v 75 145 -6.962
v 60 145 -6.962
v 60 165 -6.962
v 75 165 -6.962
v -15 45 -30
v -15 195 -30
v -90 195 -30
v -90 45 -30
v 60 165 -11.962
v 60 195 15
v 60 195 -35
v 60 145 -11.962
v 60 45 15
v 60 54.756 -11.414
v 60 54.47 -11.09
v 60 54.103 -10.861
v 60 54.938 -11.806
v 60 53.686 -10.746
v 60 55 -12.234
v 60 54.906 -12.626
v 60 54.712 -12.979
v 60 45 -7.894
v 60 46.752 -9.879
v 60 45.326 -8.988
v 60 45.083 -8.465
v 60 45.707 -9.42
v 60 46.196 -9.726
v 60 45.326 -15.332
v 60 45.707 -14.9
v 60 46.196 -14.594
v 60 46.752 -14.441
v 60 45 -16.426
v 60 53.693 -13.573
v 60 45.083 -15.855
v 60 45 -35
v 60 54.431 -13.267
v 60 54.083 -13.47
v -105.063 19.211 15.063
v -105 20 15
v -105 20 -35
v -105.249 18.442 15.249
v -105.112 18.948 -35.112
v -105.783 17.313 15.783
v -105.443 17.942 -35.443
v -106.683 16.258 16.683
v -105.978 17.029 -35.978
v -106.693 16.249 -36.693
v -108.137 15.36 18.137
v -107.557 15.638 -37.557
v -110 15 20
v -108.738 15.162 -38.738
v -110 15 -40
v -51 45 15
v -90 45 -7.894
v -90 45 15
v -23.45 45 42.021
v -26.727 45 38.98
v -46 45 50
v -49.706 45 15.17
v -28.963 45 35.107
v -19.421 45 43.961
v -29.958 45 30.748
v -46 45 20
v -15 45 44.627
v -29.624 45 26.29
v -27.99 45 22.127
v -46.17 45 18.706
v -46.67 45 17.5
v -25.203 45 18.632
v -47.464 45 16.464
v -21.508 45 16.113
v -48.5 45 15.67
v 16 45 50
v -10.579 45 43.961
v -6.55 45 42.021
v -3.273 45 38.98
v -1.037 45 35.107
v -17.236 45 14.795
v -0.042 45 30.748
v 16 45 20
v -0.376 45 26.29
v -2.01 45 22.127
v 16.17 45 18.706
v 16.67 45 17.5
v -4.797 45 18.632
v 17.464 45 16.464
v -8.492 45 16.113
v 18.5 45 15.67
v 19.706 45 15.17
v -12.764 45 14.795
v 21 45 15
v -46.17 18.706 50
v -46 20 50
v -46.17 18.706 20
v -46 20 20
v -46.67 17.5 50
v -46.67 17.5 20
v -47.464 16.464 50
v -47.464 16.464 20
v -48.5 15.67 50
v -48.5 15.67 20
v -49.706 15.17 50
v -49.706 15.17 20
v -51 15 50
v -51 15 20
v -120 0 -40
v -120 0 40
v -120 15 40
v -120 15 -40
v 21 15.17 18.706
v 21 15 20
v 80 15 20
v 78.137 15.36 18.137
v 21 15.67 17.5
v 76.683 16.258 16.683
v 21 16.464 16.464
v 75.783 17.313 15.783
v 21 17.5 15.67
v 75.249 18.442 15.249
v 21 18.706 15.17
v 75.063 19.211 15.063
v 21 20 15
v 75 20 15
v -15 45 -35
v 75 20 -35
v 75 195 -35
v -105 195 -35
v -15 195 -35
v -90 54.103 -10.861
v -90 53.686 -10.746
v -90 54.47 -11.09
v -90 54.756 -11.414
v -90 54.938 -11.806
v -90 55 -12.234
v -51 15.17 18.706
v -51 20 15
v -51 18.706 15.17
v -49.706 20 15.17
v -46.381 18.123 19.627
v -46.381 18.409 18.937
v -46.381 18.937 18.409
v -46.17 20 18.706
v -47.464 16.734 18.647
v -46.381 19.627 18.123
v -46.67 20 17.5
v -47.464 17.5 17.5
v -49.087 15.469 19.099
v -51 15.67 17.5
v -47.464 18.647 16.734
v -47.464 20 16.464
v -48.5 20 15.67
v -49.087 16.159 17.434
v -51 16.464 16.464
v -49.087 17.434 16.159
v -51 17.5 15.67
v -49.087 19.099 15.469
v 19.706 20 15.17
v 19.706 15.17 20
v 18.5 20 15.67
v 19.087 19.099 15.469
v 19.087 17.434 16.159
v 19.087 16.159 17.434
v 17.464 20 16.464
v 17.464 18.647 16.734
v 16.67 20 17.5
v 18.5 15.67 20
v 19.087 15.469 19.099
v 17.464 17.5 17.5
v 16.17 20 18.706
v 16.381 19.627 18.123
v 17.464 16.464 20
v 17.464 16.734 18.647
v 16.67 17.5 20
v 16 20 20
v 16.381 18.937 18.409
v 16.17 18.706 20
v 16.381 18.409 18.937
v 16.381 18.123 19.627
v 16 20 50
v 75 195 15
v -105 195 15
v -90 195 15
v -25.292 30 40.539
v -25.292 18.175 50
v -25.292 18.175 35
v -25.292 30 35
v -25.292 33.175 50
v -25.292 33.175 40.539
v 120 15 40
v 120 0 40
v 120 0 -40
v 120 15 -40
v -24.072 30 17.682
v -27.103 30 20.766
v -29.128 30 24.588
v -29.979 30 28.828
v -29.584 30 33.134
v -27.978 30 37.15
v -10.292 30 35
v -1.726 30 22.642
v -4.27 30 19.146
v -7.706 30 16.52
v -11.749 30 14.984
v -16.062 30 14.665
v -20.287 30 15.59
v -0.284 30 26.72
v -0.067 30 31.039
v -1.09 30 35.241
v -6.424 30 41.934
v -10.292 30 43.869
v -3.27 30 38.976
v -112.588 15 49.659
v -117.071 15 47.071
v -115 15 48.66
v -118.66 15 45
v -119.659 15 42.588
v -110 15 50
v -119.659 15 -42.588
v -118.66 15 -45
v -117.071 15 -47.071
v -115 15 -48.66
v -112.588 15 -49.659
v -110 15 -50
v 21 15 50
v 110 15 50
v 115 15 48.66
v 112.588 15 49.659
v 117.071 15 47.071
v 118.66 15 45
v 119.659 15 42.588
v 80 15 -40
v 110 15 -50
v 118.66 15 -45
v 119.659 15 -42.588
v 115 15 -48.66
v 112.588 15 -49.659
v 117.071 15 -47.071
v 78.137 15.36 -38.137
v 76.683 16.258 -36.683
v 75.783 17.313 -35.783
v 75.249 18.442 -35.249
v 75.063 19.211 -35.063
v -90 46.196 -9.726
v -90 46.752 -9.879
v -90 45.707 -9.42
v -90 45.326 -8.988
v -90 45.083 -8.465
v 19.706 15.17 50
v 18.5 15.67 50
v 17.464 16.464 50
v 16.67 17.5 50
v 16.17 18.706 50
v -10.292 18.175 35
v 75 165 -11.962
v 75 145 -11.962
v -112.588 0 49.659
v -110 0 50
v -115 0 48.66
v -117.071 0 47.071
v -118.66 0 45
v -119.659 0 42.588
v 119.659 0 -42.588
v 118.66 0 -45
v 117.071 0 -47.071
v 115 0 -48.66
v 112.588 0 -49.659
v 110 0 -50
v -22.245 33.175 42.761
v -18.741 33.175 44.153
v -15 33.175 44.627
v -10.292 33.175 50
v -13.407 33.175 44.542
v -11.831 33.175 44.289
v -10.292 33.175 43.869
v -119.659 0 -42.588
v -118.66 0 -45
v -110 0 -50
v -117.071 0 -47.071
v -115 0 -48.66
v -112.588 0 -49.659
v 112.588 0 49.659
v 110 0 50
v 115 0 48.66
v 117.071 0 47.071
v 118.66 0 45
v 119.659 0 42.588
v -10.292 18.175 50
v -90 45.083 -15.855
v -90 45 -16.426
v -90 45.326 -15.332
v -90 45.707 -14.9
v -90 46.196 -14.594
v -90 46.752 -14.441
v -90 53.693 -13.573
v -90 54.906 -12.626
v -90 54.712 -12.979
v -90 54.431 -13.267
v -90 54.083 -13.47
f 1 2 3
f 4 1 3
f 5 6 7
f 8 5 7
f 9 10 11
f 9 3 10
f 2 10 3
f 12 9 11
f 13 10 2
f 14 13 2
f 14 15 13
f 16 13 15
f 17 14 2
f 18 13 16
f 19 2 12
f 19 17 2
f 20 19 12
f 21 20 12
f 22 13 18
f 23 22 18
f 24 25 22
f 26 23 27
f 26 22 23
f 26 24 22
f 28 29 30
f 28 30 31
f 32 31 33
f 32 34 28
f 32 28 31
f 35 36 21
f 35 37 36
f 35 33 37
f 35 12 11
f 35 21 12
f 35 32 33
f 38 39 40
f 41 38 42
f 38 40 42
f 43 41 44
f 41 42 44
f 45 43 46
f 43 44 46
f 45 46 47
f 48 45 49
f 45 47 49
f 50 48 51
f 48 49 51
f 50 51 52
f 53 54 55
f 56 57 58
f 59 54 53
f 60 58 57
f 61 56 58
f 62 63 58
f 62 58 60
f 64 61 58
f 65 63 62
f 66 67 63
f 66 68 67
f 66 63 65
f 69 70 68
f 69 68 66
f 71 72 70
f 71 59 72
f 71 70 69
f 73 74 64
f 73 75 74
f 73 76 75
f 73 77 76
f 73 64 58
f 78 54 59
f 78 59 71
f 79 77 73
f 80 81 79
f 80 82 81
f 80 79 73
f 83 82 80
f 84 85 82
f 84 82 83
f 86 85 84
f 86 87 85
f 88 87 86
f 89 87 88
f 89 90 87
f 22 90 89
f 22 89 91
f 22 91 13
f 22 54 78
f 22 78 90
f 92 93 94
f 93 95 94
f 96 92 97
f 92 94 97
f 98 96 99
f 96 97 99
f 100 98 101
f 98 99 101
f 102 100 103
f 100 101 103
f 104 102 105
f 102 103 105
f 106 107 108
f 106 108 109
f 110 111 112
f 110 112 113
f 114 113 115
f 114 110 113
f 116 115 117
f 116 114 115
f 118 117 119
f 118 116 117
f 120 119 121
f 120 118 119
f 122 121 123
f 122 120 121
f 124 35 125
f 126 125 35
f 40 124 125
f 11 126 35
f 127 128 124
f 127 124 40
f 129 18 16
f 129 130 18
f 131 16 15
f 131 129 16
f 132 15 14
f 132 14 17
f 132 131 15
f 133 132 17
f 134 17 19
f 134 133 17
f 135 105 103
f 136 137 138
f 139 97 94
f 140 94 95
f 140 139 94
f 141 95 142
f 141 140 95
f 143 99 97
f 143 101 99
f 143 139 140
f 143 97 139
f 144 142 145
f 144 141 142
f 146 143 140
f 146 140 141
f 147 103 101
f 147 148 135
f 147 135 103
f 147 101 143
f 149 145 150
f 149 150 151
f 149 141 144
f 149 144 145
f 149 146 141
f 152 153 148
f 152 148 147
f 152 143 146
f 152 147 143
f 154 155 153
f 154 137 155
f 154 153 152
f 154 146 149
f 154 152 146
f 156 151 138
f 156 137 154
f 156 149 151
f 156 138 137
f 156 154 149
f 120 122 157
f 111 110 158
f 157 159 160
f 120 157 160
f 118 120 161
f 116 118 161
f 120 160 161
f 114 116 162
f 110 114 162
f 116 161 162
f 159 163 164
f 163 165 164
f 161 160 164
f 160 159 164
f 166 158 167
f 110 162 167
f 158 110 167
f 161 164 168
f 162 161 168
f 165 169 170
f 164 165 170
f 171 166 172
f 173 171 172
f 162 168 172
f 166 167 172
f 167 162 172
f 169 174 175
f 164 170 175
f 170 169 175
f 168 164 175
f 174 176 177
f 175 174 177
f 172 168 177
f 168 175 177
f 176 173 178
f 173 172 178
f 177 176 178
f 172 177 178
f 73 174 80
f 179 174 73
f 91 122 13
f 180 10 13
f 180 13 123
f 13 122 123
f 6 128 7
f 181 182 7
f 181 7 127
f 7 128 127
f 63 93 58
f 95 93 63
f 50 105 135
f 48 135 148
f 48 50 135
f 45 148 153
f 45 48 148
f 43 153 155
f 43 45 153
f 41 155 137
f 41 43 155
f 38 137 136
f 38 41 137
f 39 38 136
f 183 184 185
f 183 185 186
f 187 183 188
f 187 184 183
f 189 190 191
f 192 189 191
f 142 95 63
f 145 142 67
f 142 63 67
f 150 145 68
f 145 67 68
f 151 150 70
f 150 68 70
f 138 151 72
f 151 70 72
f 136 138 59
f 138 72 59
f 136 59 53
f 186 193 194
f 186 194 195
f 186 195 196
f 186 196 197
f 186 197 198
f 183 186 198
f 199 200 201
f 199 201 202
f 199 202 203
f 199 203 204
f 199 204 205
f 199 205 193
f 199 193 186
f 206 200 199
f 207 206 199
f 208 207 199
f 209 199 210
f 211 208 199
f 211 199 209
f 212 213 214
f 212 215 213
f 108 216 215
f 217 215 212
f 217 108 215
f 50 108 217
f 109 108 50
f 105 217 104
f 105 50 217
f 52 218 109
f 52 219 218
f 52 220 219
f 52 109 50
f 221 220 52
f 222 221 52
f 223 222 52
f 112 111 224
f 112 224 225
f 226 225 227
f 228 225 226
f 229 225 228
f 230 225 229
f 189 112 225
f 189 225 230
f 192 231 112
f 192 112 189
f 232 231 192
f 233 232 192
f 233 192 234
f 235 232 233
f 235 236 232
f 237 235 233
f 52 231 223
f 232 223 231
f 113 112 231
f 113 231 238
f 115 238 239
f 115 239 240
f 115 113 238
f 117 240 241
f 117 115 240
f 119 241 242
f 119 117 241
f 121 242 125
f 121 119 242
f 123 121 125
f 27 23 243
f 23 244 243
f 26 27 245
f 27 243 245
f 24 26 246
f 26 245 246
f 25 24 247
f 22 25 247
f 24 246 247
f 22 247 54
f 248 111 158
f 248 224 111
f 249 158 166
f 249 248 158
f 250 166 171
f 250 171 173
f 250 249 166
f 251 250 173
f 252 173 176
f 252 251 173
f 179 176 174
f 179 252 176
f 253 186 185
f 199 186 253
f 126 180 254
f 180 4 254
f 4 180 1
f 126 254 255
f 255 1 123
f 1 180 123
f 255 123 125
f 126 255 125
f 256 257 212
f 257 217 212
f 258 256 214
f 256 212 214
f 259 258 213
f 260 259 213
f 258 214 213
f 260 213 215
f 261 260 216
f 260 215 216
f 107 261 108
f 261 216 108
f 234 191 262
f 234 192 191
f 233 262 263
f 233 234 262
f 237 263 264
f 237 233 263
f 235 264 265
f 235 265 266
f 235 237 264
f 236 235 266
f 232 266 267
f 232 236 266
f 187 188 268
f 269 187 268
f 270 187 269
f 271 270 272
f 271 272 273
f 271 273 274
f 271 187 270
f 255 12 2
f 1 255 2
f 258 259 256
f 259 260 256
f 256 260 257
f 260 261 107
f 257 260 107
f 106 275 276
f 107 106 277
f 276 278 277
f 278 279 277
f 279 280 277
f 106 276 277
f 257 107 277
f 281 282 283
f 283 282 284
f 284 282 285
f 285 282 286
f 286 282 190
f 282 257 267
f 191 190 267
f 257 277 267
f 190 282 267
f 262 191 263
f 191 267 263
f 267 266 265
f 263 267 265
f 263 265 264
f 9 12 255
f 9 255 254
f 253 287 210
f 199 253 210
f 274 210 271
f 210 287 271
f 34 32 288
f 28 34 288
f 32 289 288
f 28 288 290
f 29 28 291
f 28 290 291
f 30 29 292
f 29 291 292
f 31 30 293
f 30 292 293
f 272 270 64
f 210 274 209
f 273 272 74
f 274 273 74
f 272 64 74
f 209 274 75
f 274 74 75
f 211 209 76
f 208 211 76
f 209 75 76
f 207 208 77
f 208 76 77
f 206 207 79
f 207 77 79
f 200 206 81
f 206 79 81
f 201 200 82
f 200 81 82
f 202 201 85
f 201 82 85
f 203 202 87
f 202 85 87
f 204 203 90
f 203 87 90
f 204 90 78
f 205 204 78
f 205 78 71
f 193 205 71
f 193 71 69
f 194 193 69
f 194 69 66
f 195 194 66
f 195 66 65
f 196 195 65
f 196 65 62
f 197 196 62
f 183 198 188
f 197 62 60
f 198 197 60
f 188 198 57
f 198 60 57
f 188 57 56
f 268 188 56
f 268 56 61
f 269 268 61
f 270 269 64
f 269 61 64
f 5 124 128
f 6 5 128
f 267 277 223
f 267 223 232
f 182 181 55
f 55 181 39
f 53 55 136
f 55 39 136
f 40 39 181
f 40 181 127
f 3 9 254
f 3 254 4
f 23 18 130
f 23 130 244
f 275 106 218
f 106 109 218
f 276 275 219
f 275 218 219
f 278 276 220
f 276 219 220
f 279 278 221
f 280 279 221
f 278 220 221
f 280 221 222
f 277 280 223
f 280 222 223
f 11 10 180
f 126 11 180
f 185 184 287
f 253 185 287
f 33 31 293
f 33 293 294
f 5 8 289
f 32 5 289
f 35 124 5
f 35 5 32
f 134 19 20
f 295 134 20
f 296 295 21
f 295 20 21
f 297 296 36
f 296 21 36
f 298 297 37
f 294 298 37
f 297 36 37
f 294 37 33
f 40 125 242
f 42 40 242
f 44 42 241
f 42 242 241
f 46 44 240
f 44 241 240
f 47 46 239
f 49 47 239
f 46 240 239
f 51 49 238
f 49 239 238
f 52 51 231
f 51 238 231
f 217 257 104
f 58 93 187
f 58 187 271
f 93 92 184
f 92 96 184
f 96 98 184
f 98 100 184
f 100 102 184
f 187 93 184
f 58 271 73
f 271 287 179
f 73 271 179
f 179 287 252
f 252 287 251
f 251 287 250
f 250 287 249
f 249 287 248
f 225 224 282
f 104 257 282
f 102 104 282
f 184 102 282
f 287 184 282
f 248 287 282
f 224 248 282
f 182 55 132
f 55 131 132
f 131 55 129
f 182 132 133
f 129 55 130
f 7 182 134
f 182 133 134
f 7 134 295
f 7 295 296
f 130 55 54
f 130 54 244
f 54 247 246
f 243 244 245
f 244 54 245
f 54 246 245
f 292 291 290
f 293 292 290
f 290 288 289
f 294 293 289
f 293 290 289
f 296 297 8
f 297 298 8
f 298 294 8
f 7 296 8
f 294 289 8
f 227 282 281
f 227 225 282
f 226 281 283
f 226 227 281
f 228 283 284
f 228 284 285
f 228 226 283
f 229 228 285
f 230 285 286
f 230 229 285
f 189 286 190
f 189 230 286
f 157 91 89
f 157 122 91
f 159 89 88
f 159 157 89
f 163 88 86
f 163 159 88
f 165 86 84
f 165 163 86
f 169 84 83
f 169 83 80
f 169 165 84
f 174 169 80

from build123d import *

# Parameters (mm, degrees)
SKETCH1_W            = 240
SKETCH1_H            = 100
BOSS_EXTRUDE1_DEPTH  = 15
SKETCH5_W            = 15
SKETCH5_H            = 50
BOSS_EXTRUDE4_DEPTH  = 180
SKETCH12_W           = 150
SKETCH12_H           = 50
BOSS_EXTRUDE7_DEPTH  = 30
FILLET1_R            = 5
FILLET4_R            = 5
FILLET10_R           = 5
BOSS_EXTRUDE8_DEPTH  = 30
SKETCH17_R           = 15
CUT_EXTRUDE1_DEPTH   = 15
SKETCH18_W           = 15
SKETCH18_H           = 15
CUT_EXTRUDE3_DEPTH   = 15
FILLET11_R           = 5
FILLET12_R           = 5
FILLET13_R           = 5
FILLET14_R           = 5
BOSS_EXTRUDE10_DEPTH = 150
FILLET19_R           = 1.5
FILLET20_R           = 1.5
SKETCH24_W           = 75
SKETCH24_H           = 150
BOSS_EXTRUDE11_DEPTH = 5
FILLET23_R           = 2
FILLET24_R           = 2
FILLET25_R           = 10
FILLET26_R           = 10
FILLET27_R           = 10
FILLET28_R           = 10
SKETCH25_W           = 5
SKETCH25_H           = 20
CUT_EXTRUDE4_DEPTH   = 271.046292328


with BuildPart() as part:
    # Sketch1 → Boss-Extrude1 (new body)
    with BuildSketch(Plane(origin=(0, 0, 0), x_dir=(1, 0, 0), z_dir=(0, 1, 0))):
        Rectangle(SKETCH1_W, SKETCH1_H)
    extrude(amount=BOSS_EXTRUDE1_DEPTH)

    # Sketch5 → Boss-Extrude4 (add)
    with BuildSketch(Plane(origin=(0, 15, 0), x_dir=(1, 0, 0), z_dir=(0, 1, 0))):
        with Locations((-97.5, 10)):
            Rectangle(SKETCH5_W, SKETCH5_H)
        with Locations((67.5, 10)):
            Rectangle(SKETCH5_W, SKETCH5_H)
    extrude(amount=BOSS_EXTRUDE4_DEPTH)

    # Sketch12 → Boss-Extrude7 (add)
    with BuildSketch(Plane(origin=(0, 15, 0), x_dir=(1, 0, 0), z_dir=(0, 1, 0))):
        with Locations((-15, 10)):
            Rectangle(SKETCH12_W, SKETCH12_H)
    extrude(amount=BOSS_EXTRUDE7_DEPTH)

    # Fillet1
    fillet1_edges = [part.edges().sort_by_distance(p)[0] for p in [
        (-105, 15, -10),
    ]]
    fillet(fillet1_edges, radius=FILLET1_R)

    # Fillet4
    fillet4_edges = [part.edges().sort_by_distance(p)[0] for p in [
        (-17.5, 15, -35),
    ]]
    fillet(fillet4_edges, radius=FILLET4_R)

    # Fillet10
    fillet10_edges = [part.edges().sort_by_distance(p)[0] for p in [
        (75, 15, -12.5),
    ]]
    fillet(fillet10_edges, radius=FILLET10_R)

    # Sketch15 → Boss-Extrude8 (add)
    with BuildSketch(Plane(origin=(0, 15, 0), x_dir=(1, 0, 0), z_dir=(0, 1, 0))):
        Polygon((-15, -15), (16, -15), (16, -50), (-46, -50), (-46, -15), align=None)
    extrude(amount=BOSS_EXTRUDE8_DEPTH)

    # Sketch17 → Cut-Extrude1 (cut)
    with BuildSketch(Plane(origin=(0, 45, 0), x_dir=(1, 0, 0), z_dir=(0, 1, 0))):
        with Locations(Location((-15, -29.627354627, 0), (0, 0, 270))):
            Circle(SKETCH17_R)
    extrude(amount=-CUT_EXTRUDE1_DEPTH, mode=Mode.SUBTRACT)

    # Sketch18 → Cut-Extrude3 (cut)
    with BuildSketch(Plane.XY.offset(50)):
        with Locations((-17.79206598, 25.674800875)):
            Rectangle(SKETCH18_W, SKETCH18_H)
    extrude(amount=-CUT_EXTRUDE3_DEPTH, mode=Mode.SUBTRACT)

    # Fillet11
    fillet11_edges = [part.edges().sort_by_distance(p)[0] for p in [
        (48, 15, 15),
    ]]
    fillet(fillet11_edges, radius=FILLET11_R)

    # Fillet12
    fillet12_edges = [part.edges().sort_by_distance(p)[0] for p in [
        (-78, 15, 15),
    ]]
    fillet(fillet12_edges, radius=FILLET12_R)

    # Fillet13
    fillet13_edges = [part.edges().sort_by_distance(p)[0] for p in [
        (16, 15, 35),
        (16, 32.5, 15),
        (16, 16.464466094, 16.464466094),
    ]]
    fillet(fillet13_edges, radius=FILLET13_R)

    # Fillet14
    fillet14_edges = [part.edges().sort_by_distance(p)[0] for p in [
        (-46, 32.5, 15),
        (-46, 15, 35),
        (-46, 16.464466094, 16.464466094),
    ]]
    fillet(fillet14_edges, radius=FILLET14_R)

    # Sketch23 → Boss-Extrude10 (add)
    with BuildSketch(Plane.ZY.offset(-60)):
        Polygon((-9.66, 45), (-14.66, 45), (-13.41, 55), (-10.91, 55), align=None)
    extrude(amount=BOSS_EXTRUDE10_DEPTH)

    # Fillet19
    fillet19_edges = [part.edges().sort_by_distance(p)[0] for p in [
        (-15, 55, -10.91),
    ]]
    fillet(fillet19_edges, radius=FILLET19_R)

    # Fillet20
    # the kernel refuses this fillet: 1.5 mm, written as the material it takes off along each edge
    with BuildSketch(Plane(origin=(60, 55, -13.41), x_dir=(0, 0, 1), z_dir=(-1, 0, 0))) as fillet20_piece_1:
        with BuildLine():
            CenterArc((1.325104128, -1.492553597), FILLET20_R, 95.711432961, 77.16355069)
            Line((-0.163312687, -1.306501496), (-0.193081023, -1.302780453))
            Line((-0.193081023, -1.302780453), (-0.029768336, 0.003721042))
            Line((-0.029768336, 0.003721042), (0, 0.03))
            ThreePointArc((0, 0.03), (0.587913336, 0.03), (1.172841123, 0.029851072))
            Line((1.172841123, 0.029851072), (1.175826672, 0))
        make_face()
    extrude(amount=150, mode=Mode.SUBTRACT)

    # Sketch24 → Boss-Extrude11 (add)
    with BuildSketch(Plane(origin=(0, 0, -35), x_dir=(-1, 0, 0), z_dir=(0, 0, -1))):
        with Locations((52.5, 120)):
            Rectangle(SKETCH24_W, SKETCH24_H)
    extrude(amount=-BOSS_EXTRUDE11_DEPTH)

    # Fillet23
    fillet23_edges = [part.edges().sort_by_distance(p)[0] for p in [
        (-15, 45, -9.66),
    ]]
    fillet(fillet23_edges, radius=FILLET23_R)

    # Fillet24
    fillet24_edges = [part.edges().sort_by_distance(p)[0] for p in [
        (-15, 45, -14.66),
    ]]
    fillet(fillet24_edges, radius=FILLET24_R)

    # Fillet25
    fillet25_edges = [part.edges().sort_by_distance(p)[0] for p in [
        (120, 7.5, 50),
    ]]
    fillet(fillet25_edges, radius=FILLET25_R)

    # Fillet26
    fillet26_edges = [part.edges().sort_by_distance(p)[0] for p in [
        (120, 7.5, -50),
    ]]
    fillet(fillet26_edges, radius=FILLET26_R)

    # Fillet27
    fillet27_edges = [part.edges().sort_by_distance(p)[0] for p in [
        (-120, 7.5, 50),
    ]]
    fillet(fillet27_edges, radius=FILLET27_R)

    # Fillet28
    fillet28_edges = [part.edges().sort_by_distance(p)[0] for p in [
        (-120, 7.5, -50),
    ]]
    fillet(fillet28_edges, radius=FILLET28_R)

    # Sketch25 → Cut-Extrude4 (cut, through all)
    with BuildSketch(Plane.ZY.offset(-60)):
        with Locations((-9.462355362, 155)):
            Rectangle(SKETCH25_W, SKETCH25_H)
    extrude(amount=-CUT_EXTRUDE4_DEPTH, mode=Mode.SUBTRACT)


solid = part.part
